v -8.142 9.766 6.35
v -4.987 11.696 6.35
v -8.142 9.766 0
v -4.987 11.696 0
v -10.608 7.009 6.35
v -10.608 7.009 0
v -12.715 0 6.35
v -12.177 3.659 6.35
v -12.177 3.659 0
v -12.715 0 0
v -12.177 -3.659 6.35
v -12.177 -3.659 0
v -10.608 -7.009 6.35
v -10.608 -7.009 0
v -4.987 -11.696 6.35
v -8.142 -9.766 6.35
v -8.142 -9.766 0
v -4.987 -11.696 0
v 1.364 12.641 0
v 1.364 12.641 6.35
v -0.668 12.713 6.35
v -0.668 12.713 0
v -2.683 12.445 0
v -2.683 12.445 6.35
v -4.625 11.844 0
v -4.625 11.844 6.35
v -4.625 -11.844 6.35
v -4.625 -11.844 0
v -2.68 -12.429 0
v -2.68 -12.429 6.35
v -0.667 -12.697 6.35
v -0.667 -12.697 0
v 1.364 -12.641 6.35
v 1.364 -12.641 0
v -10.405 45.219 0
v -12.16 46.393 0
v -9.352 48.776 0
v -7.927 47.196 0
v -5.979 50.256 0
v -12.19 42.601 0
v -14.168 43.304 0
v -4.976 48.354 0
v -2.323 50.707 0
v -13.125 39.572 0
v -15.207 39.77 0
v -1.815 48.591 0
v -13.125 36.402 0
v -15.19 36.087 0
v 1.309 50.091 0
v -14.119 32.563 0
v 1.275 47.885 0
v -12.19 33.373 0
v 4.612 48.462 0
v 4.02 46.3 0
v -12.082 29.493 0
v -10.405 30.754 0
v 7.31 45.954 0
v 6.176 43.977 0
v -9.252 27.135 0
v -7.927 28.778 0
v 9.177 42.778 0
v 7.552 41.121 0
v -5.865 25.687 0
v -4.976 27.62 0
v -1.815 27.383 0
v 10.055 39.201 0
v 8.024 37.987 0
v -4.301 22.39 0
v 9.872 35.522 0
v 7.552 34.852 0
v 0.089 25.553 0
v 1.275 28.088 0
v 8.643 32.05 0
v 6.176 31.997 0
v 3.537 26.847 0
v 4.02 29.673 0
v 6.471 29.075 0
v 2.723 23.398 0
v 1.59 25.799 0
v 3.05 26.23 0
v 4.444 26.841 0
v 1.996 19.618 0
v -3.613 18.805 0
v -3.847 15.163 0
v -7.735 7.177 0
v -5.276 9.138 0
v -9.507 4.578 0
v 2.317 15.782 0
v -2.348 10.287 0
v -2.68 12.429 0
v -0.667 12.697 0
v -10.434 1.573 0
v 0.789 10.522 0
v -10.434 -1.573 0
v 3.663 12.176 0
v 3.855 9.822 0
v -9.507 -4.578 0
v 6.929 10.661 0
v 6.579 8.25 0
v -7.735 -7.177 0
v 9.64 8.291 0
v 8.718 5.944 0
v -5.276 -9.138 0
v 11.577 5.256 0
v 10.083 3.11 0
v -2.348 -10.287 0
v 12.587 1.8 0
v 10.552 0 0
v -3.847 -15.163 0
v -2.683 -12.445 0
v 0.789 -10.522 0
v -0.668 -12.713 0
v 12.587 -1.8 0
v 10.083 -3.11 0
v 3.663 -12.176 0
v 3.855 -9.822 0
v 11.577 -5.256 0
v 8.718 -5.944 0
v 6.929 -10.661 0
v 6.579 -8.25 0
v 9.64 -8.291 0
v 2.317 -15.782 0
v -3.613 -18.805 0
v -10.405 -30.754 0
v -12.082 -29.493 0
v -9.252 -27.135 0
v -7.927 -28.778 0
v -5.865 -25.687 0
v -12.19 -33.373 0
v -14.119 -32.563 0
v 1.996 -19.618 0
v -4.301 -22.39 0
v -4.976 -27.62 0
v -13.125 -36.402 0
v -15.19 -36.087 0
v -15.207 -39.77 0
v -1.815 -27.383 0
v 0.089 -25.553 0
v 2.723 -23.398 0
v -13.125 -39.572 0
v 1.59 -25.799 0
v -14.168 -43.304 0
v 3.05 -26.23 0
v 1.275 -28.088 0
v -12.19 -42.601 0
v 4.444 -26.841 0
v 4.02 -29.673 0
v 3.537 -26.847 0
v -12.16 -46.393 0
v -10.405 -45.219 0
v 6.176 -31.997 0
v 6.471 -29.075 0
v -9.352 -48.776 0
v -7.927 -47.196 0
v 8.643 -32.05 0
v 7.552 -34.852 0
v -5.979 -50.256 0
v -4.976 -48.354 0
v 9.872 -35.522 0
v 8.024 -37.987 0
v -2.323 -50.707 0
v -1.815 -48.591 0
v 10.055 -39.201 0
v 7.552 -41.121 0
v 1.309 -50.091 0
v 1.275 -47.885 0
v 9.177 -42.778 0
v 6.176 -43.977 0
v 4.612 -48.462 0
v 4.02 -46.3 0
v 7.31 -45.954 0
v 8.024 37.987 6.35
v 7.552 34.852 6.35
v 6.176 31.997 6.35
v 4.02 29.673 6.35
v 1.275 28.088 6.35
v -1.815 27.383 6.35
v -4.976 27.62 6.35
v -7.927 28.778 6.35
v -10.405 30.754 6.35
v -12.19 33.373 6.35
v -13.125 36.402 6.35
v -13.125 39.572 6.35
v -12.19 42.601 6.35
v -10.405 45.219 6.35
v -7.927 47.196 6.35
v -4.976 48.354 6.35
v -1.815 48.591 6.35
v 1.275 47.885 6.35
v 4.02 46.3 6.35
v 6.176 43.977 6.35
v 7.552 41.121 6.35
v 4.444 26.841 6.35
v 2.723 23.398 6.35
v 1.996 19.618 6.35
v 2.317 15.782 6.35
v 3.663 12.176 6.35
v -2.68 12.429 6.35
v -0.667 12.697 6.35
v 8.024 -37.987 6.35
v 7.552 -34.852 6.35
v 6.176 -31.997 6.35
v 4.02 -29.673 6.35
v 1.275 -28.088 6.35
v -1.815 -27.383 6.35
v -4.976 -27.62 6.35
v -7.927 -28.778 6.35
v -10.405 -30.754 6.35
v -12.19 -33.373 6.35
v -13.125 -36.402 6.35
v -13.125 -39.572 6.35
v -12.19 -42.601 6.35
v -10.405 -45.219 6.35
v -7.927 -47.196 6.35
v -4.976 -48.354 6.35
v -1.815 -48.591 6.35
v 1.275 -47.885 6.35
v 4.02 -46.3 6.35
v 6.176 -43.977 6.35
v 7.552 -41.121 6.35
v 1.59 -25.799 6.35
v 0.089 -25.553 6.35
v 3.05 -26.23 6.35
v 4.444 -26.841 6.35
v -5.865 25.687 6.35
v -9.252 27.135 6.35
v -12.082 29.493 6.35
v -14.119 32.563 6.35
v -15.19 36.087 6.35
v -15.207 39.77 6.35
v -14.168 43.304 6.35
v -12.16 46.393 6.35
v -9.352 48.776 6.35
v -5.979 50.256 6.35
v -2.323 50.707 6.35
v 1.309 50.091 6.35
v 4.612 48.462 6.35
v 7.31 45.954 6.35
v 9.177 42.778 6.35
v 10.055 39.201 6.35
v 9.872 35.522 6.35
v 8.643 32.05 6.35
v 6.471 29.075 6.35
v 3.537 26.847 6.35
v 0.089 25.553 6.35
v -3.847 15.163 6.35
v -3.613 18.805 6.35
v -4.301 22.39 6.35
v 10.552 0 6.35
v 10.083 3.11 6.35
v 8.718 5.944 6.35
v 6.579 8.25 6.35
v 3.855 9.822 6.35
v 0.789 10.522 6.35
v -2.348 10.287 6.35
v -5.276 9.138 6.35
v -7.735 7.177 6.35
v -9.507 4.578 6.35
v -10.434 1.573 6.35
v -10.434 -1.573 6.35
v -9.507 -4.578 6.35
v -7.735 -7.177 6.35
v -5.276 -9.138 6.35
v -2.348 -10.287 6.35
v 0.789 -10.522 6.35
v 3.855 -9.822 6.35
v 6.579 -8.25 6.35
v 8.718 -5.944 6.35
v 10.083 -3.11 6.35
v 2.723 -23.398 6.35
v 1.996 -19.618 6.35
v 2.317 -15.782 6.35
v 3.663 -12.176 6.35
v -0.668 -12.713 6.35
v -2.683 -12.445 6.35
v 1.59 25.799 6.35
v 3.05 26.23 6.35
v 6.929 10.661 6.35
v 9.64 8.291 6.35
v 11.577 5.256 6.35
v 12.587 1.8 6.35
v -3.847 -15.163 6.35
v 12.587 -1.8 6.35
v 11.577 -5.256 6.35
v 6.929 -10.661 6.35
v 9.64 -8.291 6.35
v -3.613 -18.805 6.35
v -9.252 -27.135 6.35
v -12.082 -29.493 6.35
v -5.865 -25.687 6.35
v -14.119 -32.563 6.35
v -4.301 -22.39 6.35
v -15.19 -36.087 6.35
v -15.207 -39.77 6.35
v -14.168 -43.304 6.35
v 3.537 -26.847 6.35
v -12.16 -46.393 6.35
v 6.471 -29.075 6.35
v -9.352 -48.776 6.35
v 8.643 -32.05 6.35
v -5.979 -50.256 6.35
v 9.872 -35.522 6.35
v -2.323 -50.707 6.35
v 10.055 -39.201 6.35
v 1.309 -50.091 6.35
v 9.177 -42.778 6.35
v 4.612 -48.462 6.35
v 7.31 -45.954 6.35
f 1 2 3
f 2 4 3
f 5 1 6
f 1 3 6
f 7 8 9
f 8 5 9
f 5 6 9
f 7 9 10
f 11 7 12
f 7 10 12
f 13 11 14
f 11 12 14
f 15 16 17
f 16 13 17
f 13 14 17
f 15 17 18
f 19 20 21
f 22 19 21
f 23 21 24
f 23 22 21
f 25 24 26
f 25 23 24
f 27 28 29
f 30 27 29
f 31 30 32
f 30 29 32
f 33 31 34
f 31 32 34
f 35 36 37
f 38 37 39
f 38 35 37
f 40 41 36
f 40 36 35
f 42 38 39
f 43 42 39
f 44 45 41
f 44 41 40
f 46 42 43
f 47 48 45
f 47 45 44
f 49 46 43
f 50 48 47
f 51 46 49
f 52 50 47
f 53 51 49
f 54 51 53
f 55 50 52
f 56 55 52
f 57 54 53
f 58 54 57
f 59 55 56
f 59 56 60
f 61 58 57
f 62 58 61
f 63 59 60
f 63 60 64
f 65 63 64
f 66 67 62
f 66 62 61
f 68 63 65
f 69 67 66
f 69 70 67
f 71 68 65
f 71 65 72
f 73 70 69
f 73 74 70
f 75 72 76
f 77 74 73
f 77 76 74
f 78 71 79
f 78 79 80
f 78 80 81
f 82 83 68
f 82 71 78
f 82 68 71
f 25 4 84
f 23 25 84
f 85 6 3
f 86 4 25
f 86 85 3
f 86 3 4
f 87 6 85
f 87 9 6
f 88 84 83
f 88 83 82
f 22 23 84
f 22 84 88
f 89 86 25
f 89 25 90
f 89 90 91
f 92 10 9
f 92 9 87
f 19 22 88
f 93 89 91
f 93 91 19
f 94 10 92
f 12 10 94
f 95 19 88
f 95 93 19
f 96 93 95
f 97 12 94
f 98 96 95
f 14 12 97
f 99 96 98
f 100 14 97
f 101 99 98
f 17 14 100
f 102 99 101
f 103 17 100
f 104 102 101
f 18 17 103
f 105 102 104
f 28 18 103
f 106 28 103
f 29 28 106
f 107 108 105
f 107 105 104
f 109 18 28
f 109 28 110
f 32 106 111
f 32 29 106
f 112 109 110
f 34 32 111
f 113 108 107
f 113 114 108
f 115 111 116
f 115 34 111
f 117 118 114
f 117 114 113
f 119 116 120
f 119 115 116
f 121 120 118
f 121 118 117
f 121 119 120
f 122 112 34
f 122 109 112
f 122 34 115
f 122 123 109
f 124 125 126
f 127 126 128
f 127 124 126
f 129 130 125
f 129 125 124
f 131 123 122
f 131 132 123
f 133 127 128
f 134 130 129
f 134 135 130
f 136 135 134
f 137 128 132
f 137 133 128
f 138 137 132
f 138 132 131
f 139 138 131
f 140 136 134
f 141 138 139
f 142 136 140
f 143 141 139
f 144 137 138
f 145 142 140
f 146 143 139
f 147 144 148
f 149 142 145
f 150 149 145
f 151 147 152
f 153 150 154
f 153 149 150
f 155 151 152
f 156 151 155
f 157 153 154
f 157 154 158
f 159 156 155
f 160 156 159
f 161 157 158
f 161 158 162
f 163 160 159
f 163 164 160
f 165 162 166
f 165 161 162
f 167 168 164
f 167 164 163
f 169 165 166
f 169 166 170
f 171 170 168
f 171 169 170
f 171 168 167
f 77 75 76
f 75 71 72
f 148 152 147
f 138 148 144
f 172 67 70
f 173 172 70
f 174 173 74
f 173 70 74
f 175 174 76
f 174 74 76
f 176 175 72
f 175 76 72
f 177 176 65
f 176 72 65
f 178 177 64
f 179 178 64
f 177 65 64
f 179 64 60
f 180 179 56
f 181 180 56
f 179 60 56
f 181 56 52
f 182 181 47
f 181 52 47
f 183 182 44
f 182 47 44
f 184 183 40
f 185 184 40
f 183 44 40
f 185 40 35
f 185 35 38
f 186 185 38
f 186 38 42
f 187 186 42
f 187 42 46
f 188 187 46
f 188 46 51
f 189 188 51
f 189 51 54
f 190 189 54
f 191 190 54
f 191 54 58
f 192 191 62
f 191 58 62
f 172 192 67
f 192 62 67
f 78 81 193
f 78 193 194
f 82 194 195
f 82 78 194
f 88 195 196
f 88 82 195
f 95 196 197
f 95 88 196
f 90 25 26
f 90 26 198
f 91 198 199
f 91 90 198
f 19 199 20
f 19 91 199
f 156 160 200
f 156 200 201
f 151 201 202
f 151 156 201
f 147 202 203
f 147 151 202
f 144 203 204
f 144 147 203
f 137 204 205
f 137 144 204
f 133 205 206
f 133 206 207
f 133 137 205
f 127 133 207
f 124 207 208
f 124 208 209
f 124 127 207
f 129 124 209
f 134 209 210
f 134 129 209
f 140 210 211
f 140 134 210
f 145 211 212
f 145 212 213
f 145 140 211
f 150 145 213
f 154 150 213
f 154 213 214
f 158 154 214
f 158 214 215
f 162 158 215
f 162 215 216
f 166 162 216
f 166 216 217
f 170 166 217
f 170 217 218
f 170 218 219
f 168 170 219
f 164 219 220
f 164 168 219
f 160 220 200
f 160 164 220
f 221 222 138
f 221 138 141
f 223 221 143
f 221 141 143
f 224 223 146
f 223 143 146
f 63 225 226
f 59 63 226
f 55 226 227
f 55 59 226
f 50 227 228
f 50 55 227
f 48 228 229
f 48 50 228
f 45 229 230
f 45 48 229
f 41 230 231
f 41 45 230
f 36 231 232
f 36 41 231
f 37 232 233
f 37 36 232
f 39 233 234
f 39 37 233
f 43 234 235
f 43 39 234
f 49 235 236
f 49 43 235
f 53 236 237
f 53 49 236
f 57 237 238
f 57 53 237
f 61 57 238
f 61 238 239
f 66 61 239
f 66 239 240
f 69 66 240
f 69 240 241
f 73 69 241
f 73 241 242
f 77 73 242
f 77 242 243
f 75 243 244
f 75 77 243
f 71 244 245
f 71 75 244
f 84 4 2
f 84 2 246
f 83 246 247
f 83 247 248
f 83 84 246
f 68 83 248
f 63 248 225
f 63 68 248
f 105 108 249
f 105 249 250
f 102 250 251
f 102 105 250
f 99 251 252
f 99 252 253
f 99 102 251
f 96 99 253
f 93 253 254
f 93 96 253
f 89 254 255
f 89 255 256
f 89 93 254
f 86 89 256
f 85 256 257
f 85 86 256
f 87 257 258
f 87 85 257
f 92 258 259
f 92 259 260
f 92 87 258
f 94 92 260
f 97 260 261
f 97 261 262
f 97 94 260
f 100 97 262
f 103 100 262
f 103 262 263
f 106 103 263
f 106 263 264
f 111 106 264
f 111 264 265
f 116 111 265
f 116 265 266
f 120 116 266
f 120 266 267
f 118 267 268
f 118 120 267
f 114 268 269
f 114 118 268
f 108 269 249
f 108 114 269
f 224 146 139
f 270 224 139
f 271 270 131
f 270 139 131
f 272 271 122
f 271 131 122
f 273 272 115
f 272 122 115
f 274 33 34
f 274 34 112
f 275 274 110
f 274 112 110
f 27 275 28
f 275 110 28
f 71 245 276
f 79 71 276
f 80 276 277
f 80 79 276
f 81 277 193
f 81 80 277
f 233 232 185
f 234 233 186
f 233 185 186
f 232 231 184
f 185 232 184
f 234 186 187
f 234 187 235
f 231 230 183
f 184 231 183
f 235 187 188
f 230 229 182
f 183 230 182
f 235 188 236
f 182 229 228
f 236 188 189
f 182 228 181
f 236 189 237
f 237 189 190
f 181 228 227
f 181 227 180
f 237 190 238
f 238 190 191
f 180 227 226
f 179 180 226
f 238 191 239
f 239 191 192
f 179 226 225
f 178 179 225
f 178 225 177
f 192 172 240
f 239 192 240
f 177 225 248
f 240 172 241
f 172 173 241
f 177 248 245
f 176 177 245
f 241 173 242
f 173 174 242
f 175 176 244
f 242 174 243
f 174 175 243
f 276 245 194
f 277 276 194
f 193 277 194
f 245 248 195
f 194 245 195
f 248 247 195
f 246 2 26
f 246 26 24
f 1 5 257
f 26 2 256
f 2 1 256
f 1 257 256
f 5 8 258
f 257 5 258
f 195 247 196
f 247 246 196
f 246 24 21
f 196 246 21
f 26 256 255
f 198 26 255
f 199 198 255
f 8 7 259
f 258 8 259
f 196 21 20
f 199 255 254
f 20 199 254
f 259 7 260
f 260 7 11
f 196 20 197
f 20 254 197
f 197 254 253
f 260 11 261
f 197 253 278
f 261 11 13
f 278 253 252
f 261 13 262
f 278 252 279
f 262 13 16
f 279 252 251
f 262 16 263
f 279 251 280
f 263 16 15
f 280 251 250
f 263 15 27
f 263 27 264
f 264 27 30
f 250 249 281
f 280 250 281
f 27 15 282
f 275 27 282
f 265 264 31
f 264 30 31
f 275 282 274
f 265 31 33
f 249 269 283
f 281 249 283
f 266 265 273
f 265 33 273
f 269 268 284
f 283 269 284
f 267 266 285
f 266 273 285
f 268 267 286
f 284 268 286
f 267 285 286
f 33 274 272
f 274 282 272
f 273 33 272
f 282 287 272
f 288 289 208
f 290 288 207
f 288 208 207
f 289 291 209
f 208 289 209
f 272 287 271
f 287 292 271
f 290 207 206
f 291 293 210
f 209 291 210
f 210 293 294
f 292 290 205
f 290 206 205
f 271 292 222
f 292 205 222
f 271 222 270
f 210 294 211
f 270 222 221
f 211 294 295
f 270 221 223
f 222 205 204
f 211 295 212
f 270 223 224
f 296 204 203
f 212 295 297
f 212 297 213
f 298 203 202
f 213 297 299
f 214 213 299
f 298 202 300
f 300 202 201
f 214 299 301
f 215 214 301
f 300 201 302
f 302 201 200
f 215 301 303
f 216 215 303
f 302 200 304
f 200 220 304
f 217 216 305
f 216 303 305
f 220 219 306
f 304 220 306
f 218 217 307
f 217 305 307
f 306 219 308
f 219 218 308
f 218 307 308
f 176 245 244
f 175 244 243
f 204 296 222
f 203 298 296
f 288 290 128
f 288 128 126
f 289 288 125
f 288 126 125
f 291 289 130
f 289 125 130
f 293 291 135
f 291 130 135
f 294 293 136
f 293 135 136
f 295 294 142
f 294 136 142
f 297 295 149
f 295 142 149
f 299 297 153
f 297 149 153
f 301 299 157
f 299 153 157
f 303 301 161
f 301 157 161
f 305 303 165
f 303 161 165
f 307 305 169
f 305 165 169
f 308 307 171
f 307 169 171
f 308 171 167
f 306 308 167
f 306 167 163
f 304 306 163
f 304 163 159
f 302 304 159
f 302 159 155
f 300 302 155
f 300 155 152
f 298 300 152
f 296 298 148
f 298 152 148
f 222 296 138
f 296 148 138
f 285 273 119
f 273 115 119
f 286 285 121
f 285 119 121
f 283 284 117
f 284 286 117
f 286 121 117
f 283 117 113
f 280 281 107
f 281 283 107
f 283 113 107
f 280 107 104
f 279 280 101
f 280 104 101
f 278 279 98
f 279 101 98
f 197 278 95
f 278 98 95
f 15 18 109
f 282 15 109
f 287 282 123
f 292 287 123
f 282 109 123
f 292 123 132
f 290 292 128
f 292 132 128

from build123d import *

# Parameters (mm, degrees)
F0_R     = 12.714699
F0_R_2   = 10.551867
F1_DEPTH = 6.35
F3_DEPTH = 6.35
F4_R     = 12.723011
F4_R_2   = 10.633663
F5_DEPTH = 6.35


with BuildPart() as f1:
    # F0 (on Top) → F1 (new body)
    with BuildSketch(Plane.XY):
        Circle(F0_R)
        Circle(F0_R_2, mode=Mode.SUBTRACT)
    extrude(amount=F1_DEPTH)

    # F2 (on Top) → F3 (join)
    with BuildSketch(Plane.XY):
        with BuildLine():
            ThreePointArc((4.443993, -26.840774), (1.994112, -19.590243), (3.689282, -12.127099))
            ThreePointArc((3.689282, -12.127099), (-0.691024, -12.712131), (-4.990178, -11.689086))
            ThreePointArc((-4.990178, -11.689086), (-3.674645, -19.507252), (-6.686923, -26.840774))
            ThreePointArc((-6.686923, -26.840774), (-1.121465, -25.492814), (4.443993, -26.840774))
        make_face()
    extrude(amount=F3_DEPTH)

    # F4 (on Top) → F5 (join)
    with BuildSketch(Plane.XY):
        with Locations((-2.609686, -37.986754)):
            Circle(F4_R)
        with Locations((-2.609686, -37.986754)):
            Circle(F4_R_2, mode=Mode.SUBTRACT)
    extrude(amount=F5_DEPTH)

    # F6: F1 across plane


with BuildPart() as f1_1:
    add(f1.part)
    add(f1.part.mirror(Plane.XZ))


solid = f1_1.part
